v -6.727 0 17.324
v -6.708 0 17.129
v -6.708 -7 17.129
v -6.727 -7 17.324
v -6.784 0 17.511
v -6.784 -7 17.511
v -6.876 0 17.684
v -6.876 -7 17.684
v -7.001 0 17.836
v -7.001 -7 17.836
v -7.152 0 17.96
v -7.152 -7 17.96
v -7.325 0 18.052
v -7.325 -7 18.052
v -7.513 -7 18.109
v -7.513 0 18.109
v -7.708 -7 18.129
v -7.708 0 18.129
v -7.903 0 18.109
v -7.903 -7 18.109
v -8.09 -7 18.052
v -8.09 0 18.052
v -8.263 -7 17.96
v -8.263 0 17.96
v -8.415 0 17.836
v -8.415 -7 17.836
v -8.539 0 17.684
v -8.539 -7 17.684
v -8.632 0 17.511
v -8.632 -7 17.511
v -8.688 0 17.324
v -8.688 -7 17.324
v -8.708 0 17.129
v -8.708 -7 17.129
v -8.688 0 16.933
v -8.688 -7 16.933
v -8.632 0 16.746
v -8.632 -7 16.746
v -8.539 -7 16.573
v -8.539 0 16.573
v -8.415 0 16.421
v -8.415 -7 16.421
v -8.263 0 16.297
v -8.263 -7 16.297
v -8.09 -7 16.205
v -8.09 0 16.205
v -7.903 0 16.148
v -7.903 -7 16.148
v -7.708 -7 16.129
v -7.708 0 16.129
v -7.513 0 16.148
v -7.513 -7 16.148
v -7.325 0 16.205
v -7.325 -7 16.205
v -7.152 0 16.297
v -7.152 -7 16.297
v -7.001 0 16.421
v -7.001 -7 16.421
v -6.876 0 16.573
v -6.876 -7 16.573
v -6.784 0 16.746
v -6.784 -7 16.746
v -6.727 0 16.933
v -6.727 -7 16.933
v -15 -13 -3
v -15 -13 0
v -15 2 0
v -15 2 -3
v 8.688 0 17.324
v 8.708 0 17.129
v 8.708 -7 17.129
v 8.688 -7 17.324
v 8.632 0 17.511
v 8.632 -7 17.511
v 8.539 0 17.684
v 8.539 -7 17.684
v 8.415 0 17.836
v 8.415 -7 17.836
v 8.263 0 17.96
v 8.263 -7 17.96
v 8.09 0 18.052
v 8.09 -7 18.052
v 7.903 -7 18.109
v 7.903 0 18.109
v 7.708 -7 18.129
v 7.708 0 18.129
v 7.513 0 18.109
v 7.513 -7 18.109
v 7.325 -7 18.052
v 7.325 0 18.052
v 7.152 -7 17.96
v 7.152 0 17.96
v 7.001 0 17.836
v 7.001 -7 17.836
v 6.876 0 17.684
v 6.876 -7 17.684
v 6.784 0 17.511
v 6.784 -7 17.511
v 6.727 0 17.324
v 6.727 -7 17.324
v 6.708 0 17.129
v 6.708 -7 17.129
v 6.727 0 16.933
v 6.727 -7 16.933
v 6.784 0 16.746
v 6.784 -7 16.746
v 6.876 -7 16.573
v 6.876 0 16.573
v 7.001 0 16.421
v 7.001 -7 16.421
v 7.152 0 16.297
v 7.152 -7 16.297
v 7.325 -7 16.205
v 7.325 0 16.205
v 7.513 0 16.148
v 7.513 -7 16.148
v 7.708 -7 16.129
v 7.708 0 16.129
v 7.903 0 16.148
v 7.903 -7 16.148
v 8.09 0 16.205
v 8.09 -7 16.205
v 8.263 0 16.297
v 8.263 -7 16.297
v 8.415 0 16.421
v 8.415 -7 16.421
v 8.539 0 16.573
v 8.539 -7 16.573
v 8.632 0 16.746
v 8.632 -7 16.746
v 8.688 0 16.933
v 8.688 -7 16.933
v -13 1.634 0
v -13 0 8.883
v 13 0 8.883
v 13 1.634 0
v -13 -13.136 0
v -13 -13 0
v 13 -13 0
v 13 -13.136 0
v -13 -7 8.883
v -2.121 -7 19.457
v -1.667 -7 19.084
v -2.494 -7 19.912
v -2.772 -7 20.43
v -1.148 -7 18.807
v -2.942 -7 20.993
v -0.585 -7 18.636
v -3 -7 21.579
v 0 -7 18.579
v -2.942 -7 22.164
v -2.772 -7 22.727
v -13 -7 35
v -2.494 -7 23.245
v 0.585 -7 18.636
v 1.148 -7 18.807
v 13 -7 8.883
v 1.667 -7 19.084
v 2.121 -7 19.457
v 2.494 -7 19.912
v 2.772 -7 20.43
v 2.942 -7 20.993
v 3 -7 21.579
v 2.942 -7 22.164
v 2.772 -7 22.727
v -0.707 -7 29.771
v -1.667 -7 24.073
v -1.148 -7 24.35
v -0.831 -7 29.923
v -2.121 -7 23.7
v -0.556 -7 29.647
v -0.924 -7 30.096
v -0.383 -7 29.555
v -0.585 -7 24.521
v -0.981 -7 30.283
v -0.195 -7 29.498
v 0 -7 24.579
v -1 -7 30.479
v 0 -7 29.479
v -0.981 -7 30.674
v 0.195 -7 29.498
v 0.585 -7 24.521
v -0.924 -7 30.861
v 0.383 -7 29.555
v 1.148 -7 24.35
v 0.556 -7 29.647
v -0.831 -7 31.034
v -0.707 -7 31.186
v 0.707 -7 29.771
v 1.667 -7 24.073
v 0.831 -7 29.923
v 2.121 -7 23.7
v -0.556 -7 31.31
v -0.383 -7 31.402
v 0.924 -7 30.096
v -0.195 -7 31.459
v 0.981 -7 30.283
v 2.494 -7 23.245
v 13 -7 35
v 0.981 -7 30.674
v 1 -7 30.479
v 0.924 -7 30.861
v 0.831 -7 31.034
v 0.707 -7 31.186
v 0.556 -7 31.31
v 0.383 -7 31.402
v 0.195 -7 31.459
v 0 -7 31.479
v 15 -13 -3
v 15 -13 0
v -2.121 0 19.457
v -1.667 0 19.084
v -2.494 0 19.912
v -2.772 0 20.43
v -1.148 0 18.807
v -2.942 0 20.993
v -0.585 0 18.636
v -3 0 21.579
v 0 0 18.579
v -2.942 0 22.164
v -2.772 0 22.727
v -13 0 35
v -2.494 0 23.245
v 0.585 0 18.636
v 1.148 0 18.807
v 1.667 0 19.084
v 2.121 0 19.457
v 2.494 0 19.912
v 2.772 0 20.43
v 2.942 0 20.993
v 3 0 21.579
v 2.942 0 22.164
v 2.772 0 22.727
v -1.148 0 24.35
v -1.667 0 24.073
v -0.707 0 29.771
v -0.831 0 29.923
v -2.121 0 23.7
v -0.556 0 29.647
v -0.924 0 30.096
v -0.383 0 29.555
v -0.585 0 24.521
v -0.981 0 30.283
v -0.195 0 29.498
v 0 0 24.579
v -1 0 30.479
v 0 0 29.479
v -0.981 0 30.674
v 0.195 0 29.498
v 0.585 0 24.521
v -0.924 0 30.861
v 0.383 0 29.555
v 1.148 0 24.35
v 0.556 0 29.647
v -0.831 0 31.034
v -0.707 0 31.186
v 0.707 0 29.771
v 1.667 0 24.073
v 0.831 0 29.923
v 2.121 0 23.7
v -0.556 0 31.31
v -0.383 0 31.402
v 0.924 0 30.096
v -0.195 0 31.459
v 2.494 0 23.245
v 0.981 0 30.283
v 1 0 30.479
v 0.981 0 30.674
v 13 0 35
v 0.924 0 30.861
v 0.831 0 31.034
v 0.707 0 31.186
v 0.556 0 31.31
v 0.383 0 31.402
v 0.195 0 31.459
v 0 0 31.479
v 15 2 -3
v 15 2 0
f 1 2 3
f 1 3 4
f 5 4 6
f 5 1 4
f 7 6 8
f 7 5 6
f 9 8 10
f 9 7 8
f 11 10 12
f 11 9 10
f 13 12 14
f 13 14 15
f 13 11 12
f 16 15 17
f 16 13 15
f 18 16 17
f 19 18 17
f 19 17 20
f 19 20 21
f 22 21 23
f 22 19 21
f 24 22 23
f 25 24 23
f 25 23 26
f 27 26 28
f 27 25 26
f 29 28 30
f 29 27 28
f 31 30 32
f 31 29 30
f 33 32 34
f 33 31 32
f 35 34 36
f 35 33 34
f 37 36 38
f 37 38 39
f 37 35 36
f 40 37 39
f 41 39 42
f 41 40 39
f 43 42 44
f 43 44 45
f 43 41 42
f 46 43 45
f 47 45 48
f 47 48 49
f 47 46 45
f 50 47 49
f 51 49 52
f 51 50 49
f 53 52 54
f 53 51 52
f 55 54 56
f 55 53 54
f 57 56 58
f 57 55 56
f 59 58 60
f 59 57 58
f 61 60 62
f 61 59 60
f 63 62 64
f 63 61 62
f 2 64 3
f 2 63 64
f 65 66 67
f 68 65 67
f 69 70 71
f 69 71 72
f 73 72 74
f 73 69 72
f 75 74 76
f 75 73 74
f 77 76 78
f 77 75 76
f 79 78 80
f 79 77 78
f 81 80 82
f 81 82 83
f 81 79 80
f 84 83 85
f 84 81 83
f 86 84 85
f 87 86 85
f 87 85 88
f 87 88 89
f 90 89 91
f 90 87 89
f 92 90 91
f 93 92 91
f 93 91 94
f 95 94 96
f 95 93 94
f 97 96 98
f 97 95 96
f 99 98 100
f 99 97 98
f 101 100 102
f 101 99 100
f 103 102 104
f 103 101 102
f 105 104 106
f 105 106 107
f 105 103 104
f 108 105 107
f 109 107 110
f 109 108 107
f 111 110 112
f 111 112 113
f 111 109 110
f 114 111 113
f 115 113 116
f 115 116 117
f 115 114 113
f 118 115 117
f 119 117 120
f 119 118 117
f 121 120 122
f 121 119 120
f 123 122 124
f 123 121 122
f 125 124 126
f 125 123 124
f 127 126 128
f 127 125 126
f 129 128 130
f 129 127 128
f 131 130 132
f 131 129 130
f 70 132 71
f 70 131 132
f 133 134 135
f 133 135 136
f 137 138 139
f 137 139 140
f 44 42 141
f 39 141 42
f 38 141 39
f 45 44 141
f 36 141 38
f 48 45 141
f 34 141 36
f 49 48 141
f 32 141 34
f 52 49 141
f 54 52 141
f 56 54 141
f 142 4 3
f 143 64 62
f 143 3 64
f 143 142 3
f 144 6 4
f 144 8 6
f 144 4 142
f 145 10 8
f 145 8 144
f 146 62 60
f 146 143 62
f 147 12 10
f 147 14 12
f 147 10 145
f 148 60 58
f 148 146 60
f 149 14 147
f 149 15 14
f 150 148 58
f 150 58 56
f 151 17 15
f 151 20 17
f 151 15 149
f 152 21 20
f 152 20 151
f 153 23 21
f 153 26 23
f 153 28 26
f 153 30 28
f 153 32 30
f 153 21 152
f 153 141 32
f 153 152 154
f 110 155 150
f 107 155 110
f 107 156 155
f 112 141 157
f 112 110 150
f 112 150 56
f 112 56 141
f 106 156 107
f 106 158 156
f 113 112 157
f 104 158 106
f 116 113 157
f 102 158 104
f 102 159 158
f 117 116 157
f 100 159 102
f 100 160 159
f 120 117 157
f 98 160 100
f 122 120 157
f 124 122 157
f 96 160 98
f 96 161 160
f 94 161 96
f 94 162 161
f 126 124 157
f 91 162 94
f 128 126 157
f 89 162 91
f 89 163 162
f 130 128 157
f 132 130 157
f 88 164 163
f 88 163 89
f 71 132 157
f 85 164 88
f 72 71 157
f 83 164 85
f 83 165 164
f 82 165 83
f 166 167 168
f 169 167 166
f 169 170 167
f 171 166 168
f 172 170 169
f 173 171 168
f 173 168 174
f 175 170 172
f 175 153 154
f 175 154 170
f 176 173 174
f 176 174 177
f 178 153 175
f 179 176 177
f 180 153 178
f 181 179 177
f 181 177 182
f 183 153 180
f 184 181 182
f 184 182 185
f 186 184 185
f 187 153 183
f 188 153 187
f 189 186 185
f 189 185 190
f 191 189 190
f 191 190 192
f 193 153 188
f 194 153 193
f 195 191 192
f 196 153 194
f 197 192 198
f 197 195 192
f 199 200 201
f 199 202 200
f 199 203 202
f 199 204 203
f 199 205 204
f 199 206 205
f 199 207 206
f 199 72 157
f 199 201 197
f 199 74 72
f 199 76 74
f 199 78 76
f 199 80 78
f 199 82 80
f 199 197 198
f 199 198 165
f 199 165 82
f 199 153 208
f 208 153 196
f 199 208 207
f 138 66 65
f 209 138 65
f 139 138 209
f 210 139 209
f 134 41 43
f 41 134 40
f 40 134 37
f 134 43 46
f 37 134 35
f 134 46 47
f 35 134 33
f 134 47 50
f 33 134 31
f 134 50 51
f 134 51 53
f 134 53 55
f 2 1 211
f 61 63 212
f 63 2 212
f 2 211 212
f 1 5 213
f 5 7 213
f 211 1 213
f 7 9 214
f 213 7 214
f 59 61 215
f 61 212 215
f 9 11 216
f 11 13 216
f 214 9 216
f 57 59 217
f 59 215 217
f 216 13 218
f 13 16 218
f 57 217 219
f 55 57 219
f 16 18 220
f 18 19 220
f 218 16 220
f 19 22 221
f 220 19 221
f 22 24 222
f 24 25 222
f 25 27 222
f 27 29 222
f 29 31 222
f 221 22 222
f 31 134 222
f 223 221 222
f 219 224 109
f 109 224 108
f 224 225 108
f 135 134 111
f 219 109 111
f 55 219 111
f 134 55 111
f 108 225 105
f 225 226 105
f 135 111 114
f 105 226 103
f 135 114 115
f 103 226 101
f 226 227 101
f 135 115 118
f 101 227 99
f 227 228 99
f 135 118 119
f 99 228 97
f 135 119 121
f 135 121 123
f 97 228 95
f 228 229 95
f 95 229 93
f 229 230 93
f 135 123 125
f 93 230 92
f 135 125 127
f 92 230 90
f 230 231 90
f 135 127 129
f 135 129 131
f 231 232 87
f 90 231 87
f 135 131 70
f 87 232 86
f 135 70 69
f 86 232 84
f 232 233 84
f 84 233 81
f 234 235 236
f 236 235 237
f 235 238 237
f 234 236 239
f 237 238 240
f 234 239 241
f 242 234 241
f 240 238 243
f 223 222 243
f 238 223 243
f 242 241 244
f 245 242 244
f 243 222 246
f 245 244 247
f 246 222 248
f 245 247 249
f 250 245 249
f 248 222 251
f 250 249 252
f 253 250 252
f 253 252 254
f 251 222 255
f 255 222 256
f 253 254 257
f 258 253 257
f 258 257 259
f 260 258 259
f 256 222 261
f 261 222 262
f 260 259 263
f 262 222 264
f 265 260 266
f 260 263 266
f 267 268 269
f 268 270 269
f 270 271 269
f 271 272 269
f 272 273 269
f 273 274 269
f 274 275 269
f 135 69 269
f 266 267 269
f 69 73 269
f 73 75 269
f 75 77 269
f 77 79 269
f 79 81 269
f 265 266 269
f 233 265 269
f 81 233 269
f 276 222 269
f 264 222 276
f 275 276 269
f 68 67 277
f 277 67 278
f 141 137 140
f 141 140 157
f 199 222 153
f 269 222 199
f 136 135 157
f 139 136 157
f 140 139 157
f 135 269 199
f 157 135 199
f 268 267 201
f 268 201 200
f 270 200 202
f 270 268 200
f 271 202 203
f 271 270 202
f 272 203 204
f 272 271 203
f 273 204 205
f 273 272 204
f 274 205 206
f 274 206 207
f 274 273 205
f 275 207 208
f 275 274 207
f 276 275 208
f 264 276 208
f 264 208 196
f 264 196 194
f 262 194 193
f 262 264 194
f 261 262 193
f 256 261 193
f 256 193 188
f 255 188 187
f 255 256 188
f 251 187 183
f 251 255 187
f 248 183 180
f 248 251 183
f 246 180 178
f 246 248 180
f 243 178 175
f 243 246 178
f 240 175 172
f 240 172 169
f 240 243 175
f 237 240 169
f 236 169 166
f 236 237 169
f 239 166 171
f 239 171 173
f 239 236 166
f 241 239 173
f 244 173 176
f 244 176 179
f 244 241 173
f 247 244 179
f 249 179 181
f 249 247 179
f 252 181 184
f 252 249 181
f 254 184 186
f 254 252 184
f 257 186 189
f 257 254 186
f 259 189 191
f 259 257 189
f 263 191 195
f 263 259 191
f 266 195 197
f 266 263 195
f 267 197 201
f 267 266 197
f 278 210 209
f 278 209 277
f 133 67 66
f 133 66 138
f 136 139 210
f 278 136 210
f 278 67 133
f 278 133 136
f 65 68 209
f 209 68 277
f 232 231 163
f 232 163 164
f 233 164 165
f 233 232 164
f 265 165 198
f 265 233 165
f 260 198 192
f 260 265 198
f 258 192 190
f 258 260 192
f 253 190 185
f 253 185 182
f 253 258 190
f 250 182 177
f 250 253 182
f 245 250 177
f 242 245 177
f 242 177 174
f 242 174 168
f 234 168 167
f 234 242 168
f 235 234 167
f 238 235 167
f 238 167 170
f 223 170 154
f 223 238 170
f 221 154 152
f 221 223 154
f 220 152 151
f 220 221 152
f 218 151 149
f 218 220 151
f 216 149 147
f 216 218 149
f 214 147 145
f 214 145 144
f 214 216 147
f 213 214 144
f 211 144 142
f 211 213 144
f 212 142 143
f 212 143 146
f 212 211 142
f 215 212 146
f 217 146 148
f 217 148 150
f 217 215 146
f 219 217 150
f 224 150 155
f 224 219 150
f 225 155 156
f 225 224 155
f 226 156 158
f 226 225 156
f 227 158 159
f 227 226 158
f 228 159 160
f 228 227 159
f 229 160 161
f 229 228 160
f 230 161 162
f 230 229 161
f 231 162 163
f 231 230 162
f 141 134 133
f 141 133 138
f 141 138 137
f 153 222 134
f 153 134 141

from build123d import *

# Parameters (mm, degrees)
F0_W     = 26
F0_H     = 35
F0_R     = 1
F0_R_2   = 3
F1_DEPTH = 7
F2_W     = 30
F2_H     = 15
F3_DEPTH = 3
F5_DEPTH = 26


with BuildPart() as f1:
    # F0 (on Front) → F1 (new body)
    with BuildSketch(Plane.XZ):
        with Locations((0, 17.5)):
            Rectangle(F0_W, F0_H)
        with Locations((-7.707626, 17.128522)):
            Circle(F0_R, mode=Mode.SUBTRACT)
        with Locations((7.707626, 17.128522)):
            Circle(F0_R, mode=Mode.SUBTRACT)
        with Locations((0, 21.578522)):
            Circle(F0_R_2, mode=Mode.SUBTRACT)
        with Locations((0, 30.478522)):
            Circle(F0_R, mode=Mode.SUBTRACT)
    extrude(amount=F1_DEPTH)

    # F2 (on Top) → F3 (join)
    with BuildSketch(Plane.XY):
        with Locations((0, -5.5)):
            Rectangle(F2_W, F2_H)
    extrude(amount=-F3_DEPTH)

    # F4 (on face) → F5 (join)
    with BuildSketch(Plane(origin=(-13, 0, 0), x_dir=(0, -1, 0), z_dir=(-1, 0, 0))):
        Polygon((13.13559, 0), (7, 8.883364), (7, 6.872926), (11.747014, 0), align=None)
        Polygon((11.747014, 0), (7, 6.872926), (7, 4.174094), (9.882976, 0), align=None)
        Polygon((9.882976, 0), (7, 4.174094), (7, 1.96276), (8.355645, 0), align=None)
        Polygon((8.355645, 0), (7, 1.96276), (7, 0), align=None)
        Polygon((0, 4.22952), (0, 8.883364), (-1.634174, 0), (-0.778058, 0), align=None)
        Polygon((0, 0), (0, 4.22952), (-0.778058, 0), align=None)
    extrude(amount=-F5_DEPTH)


solid = f1.part
